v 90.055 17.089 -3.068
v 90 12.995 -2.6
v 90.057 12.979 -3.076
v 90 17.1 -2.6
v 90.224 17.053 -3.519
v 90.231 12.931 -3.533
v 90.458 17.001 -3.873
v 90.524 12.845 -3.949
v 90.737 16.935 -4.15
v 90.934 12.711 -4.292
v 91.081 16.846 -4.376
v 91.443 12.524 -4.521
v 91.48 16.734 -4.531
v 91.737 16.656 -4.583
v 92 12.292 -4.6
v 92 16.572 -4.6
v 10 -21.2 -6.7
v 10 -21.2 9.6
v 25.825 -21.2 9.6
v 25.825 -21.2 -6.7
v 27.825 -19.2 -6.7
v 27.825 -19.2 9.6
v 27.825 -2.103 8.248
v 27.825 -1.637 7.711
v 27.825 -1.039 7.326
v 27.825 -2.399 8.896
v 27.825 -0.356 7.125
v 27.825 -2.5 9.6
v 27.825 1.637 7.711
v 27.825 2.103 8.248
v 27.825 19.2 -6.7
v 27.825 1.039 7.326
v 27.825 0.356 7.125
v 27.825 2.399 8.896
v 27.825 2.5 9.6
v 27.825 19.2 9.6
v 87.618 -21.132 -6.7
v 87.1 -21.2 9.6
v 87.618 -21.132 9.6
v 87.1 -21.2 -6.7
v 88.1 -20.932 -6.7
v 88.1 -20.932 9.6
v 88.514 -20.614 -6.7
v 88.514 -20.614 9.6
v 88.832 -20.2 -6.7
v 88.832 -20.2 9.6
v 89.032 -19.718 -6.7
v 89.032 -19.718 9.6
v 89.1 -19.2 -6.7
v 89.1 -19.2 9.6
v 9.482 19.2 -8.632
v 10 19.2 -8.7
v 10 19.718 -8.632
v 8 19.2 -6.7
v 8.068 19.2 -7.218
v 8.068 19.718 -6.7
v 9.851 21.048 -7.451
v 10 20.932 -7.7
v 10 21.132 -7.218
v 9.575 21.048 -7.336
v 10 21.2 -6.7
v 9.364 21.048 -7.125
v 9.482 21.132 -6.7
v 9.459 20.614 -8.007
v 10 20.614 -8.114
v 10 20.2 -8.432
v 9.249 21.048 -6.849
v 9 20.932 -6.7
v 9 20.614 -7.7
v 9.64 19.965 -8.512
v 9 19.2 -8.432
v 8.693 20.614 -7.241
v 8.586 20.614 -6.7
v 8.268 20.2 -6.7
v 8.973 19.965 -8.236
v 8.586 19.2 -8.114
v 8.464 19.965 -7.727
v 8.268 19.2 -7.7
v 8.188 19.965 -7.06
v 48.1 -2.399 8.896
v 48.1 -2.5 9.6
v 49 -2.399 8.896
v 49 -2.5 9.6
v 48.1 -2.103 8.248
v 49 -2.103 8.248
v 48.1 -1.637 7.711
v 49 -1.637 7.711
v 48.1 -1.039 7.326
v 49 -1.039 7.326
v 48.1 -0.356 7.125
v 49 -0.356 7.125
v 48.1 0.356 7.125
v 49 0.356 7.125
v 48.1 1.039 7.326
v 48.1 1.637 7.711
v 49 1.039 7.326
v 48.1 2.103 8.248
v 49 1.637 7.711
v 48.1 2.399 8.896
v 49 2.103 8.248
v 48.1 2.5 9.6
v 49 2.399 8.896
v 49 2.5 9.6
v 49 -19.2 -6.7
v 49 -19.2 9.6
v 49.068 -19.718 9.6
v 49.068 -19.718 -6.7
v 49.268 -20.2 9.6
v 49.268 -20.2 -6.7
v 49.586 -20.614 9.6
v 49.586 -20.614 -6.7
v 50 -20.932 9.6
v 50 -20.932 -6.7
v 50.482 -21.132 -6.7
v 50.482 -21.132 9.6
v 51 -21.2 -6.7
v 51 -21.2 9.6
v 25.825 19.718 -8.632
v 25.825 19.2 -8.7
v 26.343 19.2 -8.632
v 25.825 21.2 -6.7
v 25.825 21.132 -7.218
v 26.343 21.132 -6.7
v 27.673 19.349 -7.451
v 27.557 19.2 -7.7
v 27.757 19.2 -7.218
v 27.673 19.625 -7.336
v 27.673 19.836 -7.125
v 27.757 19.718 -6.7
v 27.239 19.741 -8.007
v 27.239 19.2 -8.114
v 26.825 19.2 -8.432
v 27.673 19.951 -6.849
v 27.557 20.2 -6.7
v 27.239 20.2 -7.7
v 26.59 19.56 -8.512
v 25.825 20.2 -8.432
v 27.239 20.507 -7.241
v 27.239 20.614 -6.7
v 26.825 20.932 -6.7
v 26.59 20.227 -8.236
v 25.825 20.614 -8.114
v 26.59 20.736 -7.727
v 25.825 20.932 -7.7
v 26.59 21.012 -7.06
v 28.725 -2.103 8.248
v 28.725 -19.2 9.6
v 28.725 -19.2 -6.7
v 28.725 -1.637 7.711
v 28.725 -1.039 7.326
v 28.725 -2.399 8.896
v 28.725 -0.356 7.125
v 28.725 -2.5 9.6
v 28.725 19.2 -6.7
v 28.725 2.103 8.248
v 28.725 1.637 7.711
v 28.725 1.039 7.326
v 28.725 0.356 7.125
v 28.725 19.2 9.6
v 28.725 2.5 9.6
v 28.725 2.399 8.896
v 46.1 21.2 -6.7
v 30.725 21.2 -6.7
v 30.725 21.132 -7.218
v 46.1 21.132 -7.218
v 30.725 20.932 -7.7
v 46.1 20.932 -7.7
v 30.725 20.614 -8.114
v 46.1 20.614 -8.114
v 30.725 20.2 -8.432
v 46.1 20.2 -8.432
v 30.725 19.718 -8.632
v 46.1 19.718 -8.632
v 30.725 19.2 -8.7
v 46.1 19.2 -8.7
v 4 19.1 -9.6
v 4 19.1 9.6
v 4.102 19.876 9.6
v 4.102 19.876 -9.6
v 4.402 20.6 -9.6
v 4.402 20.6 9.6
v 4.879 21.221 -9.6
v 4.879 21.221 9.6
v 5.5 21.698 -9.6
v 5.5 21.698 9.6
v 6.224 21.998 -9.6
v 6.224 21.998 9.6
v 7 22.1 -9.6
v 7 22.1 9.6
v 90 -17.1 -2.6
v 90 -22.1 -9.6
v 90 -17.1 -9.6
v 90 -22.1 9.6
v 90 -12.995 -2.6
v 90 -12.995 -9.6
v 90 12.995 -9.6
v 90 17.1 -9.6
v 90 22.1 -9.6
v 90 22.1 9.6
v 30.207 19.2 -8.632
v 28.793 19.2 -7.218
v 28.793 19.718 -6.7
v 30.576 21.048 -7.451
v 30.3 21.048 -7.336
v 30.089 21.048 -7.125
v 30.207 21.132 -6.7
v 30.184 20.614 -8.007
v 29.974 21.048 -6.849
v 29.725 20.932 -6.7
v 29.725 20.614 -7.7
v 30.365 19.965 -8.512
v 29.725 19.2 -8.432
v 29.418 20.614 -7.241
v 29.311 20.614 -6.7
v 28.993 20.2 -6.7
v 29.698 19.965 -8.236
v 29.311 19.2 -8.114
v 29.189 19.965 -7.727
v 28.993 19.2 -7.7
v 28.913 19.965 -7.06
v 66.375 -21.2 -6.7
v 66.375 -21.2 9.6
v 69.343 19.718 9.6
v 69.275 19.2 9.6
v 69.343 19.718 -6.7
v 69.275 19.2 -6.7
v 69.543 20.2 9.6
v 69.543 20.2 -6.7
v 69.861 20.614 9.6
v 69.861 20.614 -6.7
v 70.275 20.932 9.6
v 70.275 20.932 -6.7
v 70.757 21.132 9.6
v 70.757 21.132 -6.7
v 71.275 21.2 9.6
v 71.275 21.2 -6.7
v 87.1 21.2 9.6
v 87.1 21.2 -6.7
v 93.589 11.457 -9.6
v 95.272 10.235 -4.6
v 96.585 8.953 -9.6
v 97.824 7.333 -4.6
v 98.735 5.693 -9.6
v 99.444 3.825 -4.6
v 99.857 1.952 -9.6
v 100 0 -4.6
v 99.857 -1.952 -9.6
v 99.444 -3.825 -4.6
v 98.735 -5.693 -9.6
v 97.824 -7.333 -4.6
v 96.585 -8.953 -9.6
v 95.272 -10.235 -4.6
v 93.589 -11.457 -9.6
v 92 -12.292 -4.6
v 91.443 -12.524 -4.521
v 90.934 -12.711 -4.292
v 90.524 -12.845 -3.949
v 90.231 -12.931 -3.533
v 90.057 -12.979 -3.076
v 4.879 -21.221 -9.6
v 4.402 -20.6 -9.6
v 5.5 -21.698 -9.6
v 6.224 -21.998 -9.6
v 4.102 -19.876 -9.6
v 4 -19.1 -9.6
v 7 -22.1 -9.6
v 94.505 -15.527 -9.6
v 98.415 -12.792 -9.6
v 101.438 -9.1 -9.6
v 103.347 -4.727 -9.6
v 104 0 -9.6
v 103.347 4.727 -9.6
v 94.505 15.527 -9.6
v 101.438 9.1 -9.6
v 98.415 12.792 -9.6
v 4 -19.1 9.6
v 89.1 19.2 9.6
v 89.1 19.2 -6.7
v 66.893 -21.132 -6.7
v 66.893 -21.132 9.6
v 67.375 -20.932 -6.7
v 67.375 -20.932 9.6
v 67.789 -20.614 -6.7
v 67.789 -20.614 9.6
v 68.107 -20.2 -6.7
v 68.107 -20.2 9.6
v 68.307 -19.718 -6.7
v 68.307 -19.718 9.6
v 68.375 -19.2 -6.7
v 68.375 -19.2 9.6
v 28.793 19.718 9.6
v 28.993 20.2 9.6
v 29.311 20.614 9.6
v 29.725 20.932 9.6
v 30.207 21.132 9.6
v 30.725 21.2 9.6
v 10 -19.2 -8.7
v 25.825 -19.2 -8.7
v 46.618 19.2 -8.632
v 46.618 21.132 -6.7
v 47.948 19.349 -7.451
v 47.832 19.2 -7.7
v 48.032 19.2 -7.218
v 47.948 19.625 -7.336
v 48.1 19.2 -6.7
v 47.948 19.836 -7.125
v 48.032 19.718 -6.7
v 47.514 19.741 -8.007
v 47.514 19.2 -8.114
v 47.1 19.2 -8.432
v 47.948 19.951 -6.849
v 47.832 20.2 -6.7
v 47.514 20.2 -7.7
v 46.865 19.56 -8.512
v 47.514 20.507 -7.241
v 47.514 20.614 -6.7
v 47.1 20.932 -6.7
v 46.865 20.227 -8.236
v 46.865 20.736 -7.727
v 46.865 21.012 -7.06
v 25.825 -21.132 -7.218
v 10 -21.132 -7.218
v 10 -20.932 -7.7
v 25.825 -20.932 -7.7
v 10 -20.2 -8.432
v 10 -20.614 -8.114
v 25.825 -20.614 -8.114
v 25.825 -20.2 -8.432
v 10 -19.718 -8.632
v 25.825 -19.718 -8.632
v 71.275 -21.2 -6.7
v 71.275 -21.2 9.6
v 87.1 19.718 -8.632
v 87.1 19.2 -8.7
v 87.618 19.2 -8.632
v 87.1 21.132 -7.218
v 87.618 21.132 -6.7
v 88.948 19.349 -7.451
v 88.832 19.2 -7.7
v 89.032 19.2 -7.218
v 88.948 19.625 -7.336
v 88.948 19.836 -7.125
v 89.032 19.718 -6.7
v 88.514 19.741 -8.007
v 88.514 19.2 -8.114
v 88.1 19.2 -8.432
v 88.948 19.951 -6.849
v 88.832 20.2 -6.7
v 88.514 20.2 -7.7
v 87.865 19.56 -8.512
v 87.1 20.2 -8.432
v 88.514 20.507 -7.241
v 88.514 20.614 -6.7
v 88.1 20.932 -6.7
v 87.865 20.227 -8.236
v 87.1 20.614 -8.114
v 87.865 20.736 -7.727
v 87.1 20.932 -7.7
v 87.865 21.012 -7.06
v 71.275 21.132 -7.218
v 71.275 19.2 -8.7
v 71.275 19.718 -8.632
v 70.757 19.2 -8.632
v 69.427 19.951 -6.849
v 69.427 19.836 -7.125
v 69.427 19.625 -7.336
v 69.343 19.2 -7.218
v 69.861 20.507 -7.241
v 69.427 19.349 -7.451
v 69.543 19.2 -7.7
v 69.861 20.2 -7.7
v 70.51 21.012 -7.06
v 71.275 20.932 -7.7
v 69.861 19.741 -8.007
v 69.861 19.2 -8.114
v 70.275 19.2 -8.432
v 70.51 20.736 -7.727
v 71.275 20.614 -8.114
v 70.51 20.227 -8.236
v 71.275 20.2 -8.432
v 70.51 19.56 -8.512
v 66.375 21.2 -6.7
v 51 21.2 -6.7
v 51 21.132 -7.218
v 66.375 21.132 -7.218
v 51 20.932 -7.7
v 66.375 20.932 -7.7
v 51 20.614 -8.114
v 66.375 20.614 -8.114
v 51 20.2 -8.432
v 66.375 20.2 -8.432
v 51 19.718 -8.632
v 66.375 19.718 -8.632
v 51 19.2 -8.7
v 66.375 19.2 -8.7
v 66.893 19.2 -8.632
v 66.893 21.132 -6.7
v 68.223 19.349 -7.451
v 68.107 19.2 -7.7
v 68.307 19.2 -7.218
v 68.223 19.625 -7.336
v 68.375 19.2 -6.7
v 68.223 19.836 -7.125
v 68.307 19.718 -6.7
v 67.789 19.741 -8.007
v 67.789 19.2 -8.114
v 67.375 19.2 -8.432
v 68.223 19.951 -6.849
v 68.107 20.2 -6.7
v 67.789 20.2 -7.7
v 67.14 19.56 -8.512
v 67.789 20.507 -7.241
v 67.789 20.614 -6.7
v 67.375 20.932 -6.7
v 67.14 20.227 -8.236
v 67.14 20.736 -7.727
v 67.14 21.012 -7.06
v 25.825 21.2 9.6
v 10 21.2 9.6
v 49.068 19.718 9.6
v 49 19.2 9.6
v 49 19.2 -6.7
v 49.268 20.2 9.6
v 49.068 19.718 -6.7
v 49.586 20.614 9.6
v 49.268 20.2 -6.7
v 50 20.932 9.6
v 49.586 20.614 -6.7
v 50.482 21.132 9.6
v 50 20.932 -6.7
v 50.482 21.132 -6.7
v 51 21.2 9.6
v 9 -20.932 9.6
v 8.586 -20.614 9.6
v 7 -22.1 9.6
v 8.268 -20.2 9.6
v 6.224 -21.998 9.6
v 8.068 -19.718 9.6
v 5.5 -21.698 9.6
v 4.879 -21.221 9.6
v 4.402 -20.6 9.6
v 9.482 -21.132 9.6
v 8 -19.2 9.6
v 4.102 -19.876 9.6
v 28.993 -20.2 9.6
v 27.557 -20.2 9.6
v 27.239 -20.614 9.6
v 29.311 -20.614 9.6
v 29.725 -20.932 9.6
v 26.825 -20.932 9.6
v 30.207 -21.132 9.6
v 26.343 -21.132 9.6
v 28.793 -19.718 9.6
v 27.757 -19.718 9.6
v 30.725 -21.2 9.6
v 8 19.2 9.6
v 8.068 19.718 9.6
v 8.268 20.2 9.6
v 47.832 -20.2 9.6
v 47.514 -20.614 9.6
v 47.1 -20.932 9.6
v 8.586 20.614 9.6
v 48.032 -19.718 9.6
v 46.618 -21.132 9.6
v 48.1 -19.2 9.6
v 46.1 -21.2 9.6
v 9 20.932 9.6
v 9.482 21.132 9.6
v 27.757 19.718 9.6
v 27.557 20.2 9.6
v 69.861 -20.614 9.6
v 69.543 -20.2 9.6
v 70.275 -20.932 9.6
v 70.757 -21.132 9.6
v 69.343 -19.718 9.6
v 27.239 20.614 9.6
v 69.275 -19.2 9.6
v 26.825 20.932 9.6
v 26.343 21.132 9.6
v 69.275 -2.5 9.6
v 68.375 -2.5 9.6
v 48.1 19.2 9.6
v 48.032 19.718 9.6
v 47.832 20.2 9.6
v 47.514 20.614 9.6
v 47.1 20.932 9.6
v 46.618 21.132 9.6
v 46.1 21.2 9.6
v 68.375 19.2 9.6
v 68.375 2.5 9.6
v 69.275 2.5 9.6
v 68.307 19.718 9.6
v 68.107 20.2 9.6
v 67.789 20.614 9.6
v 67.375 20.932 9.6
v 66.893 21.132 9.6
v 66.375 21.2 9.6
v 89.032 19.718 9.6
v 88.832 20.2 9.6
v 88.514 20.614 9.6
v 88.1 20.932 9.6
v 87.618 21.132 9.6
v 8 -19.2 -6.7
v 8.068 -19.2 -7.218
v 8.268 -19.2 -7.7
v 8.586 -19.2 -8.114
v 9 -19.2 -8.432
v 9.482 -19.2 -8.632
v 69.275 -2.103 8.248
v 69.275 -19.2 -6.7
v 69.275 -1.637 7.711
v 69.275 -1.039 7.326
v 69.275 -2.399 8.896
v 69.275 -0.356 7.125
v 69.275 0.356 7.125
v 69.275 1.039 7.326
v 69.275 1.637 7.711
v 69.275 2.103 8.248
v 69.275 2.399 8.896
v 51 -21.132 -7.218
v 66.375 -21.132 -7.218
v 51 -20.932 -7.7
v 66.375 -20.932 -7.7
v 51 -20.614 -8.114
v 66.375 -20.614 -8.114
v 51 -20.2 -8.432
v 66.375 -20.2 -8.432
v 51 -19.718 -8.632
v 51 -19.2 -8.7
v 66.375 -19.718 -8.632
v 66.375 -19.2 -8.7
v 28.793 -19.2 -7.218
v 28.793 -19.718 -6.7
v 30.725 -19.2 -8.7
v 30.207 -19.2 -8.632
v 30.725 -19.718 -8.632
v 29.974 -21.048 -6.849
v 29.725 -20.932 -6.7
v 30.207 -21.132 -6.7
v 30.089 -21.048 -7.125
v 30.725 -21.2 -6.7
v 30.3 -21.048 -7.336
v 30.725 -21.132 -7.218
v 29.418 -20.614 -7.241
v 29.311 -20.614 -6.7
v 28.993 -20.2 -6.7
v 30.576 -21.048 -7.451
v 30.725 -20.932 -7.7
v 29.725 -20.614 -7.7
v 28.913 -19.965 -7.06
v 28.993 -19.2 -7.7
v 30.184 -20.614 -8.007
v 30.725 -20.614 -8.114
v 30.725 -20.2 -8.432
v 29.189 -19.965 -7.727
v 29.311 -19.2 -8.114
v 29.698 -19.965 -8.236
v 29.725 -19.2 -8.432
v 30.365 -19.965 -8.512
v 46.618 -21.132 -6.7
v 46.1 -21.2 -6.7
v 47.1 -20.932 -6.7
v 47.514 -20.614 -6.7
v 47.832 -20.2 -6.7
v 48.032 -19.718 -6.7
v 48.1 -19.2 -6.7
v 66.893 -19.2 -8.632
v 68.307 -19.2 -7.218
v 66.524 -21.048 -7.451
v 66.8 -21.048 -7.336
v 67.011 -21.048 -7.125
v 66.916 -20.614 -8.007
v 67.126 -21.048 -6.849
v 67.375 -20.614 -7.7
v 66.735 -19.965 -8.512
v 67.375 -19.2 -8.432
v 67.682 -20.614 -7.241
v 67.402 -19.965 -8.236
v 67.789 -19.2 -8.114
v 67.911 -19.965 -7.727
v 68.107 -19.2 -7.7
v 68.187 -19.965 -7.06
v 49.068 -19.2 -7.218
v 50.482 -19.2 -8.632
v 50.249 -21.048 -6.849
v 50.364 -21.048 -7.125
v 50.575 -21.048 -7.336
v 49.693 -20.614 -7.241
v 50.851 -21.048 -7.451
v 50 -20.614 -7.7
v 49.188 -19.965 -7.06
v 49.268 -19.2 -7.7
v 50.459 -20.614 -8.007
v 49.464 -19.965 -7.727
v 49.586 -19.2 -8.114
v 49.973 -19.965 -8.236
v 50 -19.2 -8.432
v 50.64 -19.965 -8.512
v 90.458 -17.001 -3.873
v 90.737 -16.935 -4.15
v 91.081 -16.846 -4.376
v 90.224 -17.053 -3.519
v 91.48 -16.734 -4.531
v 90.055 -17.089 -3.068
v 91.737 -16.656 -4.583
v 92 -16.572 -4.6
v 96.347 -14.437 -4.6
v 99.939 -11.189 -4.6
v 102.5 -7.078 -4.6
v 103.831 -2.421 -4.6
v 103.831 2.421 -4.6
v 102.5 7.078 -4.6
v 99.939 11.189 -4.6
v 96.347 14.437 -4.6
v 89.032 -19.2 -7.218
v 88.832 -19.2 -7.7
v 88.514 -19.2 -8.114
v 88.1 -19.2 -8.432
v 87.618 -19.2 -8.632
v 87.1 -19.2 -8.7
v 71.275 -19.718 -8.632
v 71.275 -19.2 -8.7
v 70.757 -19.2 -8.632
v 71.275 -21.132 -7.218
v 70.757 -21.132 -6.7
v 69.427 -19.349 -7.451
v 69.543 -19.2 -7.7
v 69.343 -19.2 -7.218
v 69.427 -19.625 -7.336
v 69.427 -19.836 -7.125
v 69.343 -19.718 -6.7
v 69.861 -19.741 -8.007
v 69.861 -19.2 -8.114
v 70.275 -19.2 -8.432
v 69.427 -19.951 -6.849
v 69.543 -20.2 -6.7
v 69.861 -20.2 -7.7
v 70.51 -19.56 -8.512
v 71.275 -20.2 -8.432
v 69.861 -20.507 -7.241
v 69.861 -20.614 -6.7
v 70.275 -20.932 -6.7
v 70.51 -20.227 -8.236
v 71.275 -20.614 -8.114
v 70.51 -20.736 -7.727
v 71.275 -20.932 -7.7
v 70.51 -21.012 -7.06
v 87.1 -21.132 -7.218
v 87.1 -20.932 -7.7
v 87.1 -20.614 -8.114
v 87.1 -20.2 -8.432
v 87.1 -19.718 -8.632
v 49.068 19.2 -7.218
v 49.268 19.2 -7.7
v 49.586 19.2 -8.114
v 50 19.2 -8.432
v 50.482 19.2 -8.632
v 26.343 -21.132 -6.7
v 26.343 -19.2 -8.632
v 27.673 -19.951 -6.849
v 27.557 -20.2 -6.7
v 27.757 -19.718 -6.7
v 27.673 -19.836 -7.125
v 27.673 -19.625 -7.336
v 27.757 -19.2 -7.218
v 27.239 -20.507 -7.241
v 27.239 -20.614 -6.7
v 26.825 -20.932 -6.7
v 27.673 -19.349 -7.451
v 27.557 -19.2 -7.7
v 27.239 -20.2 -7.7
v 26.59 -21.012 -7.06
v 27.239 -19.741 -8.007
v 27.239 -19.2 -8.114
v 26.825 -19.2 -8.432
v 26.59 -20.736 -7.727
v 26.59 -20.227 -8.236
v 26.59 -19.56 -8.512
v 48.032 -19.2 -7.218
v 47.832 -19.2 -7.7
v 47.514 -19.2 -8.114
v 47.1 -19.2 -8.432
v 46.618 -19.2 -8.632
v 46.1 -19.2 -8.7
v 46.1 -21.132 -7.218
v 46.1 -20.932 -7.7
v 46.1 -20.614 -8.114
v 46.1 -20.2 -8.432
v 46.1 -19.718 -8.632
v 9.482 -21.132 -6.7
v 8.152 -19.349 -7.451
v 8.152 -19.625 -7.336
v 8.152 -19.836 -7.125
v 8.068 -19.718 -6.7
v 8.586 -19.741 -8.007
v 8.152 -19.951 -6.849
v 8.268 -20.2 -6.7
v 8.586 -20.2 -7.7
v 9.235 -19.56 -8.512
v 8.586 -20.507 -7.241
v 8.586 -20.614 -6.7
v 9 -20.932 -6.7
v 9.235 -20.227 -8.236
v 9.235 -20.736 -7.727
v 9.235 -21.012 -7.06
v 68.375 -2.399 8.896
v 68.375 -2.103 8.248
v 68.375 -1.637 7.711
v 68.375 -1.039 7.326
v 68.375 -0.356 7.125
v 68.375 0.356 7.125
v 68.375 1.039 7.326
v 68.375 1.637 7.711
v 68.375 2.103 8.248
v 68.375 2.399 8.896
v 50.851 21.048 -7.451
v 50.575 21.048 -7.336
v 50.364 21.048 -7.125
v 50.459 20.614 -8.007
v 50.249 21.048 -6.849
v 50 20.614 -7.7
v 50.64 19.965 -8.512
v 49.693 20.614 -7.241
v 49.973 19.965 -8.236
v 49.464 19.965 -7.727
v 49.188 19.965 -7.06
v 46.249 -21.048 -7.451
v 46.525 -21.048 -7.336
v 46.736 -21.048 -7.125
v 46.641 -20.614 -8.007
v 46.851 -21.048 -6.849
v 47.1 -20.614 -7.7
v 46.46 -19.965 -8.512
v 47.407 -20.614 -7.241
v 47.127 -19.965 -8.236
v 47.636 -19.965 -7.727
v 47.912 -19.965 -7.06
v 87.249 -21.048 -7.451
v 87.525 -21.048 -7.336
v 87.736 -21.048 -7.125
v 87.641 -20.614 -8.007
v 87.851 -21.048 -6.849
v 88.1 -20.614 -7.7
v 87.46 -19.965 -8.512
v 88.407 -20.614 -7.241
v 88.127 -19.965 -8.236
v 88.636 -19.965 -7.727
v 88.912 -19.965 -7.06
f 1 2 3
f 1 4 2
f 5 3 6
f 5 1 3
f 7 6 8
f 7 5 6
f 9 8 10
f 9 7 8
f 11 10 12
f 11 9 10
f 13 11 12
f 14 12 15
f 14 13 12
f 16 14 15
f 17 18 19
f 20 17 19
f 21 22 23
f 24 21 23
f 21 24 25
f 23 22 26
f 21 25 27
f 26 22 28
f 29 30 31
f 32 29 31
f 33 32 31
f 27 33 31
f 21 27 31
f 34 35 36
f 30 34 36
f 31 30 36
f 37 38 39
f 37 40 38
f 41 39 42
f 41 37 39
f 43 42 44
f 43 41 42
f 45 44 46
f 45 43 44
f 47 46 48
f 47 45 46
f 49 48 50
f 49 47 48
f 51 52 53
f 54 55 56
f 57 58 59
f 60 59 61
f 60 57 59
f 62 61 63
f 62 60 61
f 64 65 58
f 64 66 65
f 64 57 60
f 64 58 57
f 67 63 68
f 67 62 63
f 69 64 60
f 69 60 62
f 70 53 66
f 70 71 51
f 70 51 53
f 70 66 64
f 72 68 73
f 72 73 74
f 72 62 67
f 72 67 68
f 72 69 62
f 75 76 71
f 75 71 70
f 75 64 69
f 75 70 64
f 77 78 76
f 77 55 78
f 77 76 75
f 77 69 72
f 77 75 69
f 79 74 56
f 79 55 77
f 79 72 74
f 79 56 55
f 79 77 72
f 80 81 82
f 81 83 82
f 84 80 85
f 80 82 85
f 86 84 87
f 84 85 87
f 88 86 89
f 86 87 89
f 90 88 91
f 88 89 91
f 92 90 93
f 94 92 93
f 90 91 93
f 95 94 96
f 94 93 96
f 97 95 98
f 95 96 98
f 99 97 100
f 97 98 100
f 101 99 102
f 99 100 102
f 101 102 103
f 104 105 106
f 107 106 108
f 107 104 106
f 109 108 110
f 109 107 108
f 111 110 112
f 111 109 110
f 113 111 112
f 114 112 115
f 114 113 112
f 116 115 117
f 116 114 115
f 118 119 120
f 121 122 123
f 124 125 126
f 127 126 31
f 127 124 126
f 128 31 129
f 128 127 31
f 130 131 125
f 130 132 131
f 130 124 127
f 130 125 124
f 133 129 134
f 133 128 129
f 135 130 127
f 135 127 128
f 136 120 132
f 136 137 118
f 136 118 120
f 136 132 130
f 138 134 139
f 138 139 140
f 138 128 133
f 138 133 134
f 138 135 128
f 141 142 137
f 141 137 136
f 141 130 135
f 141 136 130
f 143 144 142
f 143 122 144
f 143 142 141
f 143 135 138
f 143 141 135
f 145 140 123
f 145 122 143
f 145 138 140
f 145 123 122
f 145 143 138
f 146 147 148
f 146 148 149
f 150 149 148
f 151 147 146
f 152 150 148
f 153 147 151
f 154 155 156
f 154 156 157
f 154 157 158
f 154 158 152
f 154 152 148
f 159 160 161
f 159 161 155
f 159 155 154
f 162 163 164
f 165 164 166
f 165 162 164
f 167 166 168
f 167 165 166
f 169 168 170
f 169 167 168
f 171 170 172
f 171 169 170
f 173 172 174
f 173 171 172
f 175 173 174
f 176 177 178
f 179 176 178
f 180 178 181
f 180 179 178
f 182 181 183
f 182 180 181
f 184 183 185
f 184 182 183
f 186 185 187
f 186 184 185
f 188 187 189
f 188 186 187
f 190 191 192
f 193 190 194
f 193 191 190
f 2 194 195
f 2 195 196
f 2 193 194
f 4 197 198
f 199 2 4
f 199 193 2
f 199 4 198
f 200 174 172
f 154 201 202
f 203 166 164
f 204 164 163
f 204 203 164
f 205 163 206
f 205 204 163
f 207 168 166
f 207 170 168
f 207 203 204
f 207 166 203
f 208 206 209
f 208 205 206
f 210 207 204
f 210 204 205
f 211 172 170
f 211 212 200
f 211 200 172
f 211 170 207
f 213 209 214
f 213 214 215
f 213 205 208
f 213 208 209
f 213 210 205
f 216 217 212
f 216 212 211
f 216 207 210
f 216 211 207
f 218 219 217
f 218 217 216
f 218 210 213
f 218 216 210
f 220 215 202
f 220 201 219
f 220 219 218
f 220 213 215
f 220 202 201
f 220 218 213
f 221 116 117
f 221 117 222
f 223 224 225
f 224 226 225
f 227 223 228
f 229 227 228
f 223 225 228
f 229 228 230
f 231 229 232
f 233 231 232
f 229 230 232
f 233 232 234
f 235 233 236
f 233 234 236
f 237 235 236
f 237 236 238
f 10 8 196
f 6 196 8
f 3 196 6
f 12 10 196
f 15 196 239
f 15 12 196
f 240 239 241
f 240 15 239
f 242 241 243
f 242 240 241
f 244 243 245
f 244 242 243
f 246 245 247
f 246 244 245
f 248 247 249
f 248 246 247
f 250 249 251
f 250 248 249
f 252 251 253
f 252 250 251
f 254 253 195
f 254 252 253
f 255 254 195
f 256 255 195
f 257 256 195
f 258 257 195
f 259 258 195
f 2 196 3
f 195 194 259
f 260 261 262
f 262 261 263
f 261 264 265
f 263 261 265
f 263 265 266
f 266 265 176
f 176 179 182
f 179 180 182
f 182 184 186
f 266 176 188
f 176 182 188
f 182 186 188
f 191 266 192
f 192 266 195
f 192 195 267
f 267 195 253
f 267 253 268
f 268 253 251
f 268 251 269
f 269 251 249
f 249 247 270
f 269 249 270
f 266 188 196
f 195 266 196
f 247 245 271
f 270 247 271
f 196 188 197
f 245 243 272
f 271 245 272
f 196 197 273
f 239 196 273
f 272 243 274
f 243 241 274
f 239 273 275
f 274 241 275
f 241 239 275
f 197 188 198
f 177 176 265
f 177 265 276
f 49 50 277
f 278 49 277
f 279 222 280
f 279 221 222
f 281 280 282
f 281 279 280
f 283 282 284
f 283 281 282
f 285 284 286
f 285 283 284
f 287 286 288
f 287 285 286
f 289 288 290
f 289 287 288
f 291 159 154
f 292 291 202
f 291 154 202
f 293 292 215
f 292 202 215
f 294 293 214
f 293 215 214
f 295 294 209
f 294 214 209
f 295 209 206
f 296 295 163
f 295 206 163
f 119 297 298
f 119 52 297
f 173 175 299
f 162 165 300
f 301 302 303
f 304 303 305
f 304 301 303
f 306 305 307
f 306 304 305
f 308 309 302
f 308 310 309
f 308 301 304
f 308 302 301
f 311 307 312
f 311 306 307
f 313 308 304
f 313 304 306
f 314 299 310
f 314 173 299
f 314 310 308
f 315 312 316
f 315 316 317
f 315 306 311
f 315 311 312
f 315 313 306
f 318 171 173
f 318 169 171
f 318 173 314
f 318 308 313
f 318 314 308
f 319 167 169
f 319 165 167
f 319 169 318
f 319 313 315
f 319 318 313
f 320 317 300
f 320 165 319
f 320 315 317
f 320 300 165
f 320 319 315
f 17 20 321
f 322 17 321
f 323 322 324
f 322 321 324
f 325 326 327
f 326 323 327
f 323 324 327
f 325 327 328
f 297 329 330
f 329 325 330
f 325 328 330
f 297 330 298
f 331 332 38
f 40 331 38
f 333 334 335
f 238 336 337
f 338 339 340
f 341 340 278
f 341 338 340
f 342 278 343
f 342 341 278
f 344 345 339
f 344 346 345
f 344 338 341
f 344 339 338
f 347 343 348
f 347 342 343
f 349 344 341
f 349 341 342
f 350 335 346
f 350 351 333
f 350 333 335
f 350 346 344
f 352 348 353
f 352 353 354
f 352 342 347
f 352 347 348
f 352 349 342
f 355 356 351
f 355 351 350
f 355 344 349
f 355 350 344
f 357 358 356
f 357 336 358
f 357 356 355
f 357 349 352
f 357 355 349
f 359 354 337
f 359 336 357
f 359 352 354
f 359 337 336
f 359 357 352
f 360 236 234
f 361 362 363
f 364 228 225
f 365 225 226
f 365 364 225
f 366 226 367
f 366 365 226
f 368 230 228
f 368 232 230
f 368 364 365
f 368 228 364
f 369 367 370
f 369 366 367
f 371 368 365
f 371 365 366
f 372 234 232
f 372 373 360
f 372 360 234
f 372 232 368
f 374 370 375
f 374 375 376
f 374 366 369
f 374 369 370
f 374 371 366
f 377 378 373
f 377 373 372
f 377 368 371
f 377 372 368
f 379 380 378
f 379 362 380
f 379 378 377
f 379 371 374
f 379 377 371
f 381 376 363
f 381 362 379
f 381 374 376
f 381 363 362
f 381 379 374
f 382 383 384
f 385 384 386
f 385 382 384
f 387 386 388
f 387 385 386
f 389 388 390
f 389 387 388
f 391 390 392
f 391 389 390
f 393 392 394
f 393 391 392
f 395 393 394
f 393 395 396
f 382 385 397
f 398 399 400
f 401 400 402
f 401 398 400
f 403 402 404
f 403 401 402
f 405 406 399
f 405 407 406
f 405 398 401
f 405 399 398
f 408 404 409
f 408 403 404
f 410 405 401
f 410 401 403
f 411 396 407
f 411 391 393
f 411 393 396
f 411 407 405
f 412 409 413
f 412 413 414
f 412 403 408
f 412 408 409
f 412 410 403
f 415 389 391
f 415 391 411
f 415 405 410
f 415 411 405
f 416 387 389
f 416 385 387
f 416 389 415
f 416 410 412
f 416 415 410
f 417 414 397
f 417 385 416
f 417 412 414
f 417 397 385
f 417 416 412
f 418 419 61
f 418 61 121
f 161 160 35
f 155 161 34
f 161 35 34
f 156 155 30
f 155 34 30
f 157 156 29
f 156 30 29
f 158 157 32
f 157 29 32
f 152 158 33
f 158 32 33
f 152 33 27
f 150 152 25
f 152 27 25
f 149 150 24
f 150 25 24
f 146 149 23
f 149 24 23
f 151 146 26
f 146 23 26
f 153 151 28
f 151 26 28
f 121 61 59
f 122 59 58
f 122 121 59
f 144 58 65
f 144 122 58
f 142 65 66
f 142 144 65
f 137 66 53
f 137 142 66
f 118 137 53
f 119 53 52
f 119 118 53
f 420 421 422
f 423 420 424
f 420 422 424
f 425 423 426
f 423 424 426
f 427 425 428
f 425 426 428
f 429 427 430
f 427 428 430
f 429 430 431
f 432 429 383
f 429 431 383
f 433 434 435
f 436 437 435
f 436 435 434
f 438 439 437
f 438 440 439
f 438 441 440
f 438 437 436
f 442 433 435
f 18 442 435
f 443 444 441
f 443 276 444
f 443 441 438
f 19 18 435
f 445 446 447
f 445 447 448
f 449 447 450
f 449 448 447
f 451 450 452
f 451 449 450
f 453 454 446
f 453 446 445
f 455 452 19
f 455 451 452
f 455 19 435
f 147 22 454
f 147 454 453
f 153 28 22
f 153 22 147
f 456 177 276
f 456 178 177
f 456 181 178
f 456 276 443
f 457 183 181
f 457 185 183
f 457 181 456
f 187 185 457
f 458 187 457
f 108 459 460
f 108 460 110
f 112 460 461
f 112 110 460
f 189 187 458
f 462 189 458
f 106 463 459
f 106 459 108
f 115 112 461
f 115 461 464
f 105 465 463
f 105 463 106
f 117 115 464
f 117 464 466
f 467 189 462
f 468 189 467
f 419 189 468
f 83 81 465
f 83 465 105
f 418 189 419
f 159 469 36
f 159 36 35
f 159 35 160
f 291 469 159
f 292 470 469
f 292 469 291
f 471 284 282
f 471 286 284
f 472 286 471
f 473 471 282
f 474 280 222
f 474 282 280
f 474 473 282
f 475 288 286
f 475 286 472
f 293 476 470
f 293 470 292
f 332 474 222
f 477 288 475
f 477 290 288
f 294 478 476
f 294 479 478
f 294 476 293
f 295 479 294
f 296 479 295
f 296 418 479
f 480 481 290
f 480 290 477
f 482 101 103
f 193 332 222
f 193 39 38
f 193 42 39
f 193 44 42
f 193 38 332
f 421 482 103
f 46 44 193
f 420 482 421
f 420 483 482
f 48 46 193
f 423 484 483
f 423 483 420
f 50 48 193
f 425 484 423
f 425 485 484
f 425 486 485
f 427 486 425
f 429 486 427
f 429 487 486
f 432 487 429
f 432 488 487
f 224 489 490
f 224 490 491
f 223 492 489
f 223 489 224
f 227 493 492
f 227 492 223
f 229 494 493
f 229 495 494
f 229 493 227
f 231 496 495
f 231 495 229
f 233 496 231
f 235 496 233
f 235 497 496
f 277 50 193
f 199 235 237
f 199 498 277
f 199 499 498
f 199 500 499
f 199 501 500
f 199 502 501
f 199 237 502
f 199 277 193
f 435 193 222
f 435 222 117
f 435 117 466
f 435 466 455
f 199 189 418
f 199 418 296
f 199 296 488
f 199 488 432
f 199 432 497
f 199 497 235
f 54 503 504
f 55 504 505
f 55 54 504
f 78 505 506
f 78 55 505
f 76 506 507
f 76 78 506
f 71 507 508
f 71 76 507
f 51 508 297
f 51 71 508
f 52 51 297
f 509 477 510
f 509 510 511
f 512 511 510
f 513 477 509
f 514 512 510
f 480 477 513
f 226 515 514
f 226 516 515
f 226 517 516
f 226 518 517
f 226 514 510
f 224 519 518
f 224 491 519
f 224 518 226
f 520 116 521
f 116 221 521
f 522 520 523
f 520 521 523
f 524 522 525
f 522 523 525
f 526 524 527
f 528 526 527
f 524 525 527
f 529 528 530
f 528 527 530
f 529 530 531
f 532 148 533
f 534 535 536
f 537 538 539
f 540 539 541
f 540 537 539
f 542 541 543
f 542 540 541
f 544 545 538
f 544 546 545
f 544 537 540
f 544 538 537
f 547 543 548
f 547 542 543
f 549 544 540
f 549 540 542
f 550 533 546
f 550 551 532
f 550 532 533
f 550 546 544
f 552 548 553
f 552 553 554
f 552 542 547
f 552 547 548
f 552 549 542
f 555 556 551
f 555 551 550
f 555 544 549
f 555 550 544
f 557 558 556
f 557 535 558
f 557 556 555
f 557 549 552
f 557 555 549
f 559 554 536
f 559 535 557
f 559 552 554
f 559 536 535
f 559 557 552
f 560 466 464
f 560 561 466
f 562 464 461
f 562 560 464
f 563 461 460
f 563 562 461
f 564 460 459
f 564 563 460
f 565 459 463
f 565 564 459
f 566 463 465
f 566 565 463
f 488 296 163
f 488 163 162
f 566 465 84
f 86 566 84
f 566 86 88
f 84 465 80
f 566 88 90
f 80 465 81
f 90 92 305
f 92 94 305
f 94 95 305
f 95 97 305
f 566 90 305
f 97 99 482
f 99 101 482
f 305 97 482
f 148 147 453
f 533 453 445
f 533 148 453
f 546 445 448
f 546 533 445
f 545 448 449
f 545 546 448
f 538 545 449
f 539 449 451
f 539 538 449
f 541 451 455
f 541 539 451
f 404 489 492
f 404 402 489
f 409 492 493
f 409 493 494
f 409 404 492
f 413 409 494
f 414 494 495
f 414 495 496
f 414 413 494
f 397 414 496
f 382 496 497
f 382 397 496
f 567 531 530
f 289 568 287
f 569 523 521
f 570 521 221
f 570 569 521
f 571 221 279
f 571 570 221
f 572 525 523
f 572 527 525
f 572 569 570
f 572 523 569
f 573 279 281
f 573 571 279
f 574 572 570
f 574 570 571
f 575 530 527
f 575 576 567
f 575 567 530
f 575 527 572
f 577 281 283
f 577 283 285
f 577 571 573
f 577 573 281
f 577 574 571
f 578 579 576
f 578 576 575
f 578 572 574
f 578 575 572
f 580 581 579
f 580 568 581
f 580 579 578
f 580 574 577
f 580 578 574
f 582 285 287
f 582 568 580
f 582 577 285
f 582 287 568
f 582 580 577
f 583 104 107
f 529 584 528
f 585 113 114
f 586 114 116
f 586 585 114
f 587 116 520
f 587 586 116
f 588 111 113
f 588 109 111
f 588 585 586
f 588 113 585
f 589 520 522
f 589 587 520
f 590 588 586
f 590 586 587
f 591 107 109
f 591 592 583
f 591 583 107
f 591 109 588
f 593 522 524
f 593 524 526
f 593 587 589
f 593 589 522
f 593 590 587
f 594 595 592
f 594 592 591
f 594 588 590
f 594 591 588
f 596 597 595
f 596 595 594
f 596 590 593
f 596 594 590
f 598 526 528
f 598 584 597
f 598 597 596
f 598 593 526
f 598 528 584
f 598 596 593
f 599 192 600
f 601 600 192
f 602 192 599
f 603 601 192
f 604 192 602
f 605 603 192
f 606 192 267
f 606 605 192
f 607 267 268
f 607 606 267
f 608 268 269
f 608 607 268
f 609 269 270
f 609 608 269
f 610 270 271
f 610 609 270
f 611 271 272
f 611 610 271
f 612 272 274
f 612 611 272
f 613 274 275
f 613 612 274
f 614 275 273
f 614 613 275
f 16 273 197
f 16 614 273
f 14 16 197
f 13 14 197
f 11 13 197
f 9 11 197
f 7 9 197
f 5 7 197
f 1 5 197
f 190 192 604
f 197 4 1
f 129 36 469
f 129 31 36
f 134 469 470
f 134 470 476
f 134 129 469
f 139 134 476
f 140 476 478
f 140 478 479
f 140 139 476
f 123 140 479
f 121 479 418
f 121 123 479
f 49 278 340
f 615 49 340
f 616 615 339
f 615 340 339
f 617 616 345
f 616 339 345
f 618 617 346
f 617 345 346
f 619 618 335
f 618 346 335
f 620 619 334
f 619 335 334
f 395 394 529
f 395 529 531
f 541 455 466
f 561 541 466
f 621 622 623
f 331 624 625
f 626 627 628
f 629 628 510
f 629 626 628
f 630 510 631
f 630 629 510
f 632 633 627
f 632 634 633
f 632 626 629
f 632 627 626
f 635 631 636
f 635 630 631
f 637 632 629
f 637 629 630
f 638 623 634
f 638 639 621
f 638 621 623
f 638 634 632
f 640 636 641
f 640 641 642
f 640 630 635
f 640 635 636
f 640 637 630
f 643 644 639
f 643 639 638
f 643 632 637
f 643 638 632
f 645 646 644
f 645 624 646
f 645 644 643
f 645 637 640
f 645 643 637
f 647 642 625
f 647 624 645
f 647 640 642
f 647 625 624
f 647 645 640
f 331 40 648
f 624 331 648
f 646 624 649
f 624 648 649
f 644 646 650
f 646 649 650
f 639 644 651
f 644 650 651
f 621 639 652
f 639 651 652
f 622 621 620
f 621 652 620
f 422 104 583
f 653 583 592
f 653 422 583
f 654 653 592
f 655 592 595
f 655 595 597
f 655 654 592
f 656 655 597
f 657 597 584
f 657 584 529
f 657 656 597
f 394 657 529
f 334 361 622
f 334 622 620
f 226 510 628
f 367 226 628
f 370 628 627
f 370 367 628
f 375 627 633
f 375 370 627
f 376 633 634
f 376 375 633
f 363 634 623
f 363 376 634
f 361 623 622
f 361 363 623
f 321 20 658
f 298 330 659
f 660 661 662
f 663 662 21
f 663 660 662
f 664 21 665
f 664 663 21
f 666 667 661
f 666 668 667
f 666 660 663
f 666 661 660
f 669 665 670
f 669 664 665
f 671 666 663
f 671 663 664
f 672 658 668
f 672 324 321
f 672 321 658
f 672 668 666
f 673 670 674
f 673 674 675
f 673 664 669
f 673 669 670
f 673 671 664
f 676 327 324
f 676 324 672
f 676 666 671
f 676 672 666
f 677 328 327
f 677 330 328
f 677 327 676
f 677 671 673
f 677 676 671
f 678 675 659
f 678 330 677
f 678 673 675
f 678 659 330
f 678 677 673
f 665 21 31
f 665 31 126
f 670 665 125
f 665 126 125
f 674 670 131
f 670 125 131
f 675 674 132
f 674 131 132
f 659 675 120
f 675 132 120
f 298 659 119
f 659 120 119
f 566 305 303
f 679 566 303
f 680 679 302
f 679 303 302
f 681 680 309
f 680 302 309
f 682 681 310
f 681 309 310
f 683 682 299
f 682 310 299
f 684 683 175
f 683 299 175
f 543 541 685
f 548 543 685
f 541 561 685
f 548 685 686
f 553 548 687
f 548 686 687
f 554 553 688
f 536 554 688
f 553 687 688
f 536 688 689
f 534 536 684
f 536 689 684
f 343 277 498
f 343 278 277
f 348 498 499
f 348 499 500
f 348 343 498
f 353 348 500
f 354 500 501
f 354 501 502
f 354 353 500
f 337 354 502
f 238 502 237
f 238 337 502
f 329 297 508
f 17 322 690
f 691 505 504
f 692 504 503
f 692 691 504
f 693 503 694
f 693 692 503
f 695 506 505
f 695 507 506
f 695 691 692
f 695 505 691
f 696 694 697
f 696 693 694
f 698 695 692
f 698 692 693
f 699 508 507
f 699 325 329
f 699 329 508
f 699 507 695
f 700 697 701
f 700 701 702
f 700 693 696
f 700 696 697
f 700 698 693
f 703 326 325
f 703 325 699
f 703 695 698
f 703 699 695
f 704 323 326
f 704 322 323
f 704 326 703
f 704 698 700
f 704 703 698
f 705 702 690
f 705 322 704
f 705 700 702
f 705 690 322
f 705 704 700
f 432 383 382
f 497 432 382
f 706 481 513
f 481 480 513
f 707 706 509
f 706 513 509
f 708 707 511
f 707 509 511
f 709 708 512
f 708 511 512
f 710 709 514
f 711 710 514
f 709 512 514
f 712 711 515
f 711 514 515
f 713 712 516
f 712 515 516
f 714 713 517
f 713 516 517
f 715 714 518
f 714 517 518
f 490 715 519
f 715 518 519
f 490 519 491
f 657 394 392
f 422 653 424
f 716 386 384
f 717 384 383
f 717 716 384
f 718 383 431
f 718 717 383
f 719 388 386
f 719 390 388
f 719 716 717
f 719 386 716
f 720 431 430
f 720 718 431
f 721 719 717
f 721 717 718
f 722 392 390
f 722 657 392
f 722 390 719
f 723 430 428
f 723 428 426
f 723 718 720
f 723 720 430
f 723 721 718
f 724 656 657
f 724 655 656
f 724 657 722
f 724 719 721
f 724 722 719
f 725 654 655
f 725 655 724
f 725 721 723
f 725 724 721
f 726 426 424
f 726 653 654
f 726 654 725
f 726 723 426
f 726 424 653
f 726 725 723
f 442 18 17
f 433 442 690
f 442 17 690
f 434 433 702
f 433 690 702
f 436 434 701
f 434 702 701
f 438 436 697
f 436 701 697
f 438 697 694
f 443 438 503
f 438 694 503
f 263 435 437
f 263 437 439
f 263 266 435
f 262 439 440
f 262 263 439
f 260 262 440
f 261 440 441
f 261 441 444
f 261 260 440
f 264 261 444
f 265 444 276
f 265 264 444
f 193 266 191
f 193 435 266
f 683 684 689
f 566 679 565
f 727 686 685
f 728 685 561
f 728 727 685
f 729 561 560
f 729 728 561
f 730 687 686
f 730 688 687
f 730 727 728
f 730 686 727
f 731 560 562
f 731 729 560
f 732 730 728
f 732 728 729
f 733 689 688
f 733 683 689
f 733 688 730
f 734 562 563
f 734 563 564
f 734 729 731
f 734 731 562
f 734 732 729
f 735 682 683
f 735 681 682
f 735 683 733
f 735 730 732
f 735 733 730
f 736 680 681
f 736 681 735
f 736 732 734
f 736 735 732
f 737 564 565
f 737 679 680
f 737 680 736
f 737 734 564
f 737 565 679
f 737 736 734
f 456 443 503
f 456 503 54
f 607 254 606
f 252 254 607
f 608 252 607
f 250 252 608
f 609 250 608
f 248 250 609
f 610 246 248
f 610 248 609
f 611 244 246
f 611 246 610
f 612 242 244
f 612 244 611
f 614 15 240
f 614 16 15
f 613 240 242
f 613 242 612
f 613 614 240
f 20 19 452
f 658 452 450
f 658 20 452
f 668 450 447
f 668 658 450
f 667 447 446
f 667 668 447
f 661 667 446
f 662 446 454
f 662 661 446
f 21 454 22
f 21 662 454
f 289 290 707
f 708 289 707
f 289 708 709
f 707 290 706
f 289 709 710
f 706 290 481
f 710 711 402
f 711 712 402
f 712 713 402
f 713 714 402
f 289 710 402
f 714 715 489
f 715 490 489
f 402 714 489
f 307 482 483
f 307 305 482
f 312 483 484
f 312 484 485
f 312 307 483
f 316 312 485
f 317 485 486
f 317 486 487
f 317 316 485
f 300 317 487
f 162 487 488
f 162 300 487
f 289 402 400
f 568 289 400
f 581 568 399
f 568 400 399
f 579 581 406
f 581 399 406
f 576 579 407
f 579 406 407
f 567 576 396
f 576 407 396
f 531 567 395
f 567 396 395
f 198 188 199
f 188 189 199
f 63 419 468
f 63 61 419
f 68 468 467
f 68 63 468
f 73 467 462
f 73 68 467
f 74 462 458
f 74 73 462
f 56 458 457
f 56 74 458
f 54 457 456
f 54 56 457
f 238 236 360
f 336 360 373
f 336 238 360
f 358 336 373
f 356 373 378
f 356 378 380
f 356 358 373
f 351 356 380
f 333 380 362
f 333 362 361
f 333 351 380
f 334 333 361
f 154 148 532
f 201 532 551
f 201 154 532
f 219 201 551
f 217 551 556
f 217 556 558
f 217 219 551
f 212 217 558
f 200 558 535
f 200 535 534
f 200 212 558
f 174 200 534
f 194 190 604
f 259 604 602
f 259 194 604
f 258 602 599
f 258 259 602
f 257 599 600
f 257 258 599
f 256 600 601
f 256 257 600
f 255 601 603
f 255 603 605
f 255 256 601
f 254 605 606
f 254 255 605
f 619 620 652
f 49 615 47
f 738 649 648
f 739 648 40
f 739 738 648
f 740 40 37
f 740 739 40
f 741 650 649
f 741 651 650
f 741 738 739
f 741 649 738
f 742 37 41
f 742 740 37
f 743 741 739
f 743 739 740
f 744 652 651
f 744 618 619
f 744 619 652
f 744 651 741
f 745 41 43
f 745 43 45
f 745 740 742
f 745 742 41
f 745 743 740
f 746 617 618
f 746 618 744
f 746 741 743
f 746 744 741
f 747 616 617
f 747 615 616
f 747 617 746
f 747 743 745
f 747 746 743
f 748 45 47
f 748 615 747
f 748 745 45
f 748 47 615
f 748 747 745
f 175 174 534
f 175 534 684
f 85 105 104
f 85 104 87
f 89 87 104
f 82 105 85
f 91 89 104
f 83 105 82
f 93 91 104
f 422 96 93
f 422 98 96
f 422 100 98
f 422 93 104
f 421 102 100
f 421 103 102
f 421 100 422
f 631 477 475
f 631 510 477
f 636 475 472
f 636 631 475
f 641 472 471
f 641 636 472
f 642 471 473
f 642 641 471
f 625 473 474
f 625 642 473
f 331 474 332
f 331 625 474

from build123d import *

# Parameters (mm, degrees)
SKETCH_1_W                  = 86
SKETCH_1_H                  = 44.2
EXTRUDE_1_DEPTH             = 14.2
EXTRUDE_2_DEPTH             = 5
SKETCH_3_W                  = 19.825
SKETCH_3_H                  = 42.4
CUT_EXTRUDE_1_DEPTH         = 18.3
SKETCH_4_W                  = 19.375
SKETCH_4_H                  = 42.4
CUT_EXTRUDE_2_DEPTH         = 18.3
SKETCH_5_W                  = 19.375
SKETCH_5_H                  = 42.4
CUT_EXTRUDE_3_DEPTH         = 18.3
SKETCH_6_W                  = 19.825
SKETCH_6_H                  = 42.4
CUT_EXTRUDE_4_DEPTH         = 18.3
HOLE_WIZARD_8_3_8_3_1_D     = 8.3
HOLE_WIZARD_8_3_8_3_1_DEPTH = 3.2
HOLE_WIZARD_5_0_5_1_D       = 5
HOLE_WIZARD_5_0_5_1_DEPTH   = 0.9
HOLE_WIZARD_5_0_5_2_D       = 5
HOLE_WIZARD_5_0_5_2_DEPTH   = 0.9
HOLE_WIZARD_5_0_5_3_D       = 5
HOLE_WIZARD_5_0_5_3_DEPTH   = 0.9
FILLET_1_R                  = 3
EXTRUDE_START               = -3.5
SKETCH_15_R                 = 4.15
EXTRUDE_3_DEPTH             = 3.5
FILLET_3_R                  = 2


with BuildPart() as part:
    # Эскиз1 → Бобышка-Вытянуть1 (new body)
    with BuildSketch(Plane.XY.offset(9.6)):
        with Locations((47, 0)):
            Rectangle(SKETCH_1_W, SKETCH_1_H)
    extrude(amount=-EXTRUDE_1_DEPTH)

    # Эскиз2 → Бобышка-Вытянуть2 (add)
    with BuildSketch(Plane(origin=(0, 0, -4.6), x_dir=(-1, 0, 0), z_dir=(0, 0, -1))):
        with BuildLine():
            Line((-90, -22.1), (-90, -17.1))
            ThreePointArc((-90, -17.1), (-104, 0), (-90, 17.1))
            Line((-90, 17.1), (-90, 22.1))
            Line((-90, 22.1), (-4, 22.1))
            Line((-4, 22.1), (-4, -22.1))
            Line((-4, -22.1), (-90, -22.1))
        make_face()
        with BuildLine():
            Line((-90, -12.994779171), (-90, 12.994779171))
            ThreePointArc((-90, 12.994779171), (-100, 0), (-90, -12.994779171))
        make_face(mode=Mode.SUBTRACT)
    extrude(amount=EXTRUDE_2_DEPTH)

    # Эскиз3 → Вырез-Вытянуть1 (cut)
    with BuildSketch(Plane.XY.offset(9.6)):
        with Locations((79.1875, 0)):
            Rectangle(SKETCH_3_W, SKETCH_3_H)
    extrude(amount=-CUT_EXTRUDE_1_DEPTH, mode=Mode.SUBTRACT)

    # Эскиз4 → Вырез-Вытянуть2 (cut)
    with BuildSketch(Plane.XY.offset(9.6)):
        with Locations((58.6875, 0)):
            Rectangle(SKETCH_4_W, SKETCH_4_H)
    extrude(amount=-CUT_EXTRUDE_2_DEPTH, mode=Mode.SUBTRACT)

    # Эскиз5 → Вырез-Вытянуть3 (cut)
    with BuildSketch(Plane.XY.offset(9.6)):
        with Locations((38.4125, 0)):
            Rectangle(SKETCH_5_W, SKETCH_5_H)
    extrude(amount=-CUT_EXTRUDE_3_DEPTH, mode=Mode.SUBTRACT)

    # Эскиз6 → Вырез-Вытянуть4 (cut)
    with BuildSketch(Plane.XY.offset(9.6)):
        with Locations((17.9125, 0)):
            Rectangle(SKETCH_6_W, SKETCH_6_H)
    extrude(amount=-CUT_EXTRUDE_4_DEPTH, mode=Mode.SUBTRACT)

    # Диаметр отверстия Ø8.3 (8.3)1
    with Locations(Plane.ZY.offset(-4)):
        with Locations((0, 0)):
            Hole(HOLE_WIZARD_8_3_8_3_1_D / 2, depth=HOLE_WIZARD_8_3_8_3_1_DEPTH)

    # Диаметр отверстия Ø5.0 (5)1
    with Locations(Plane(origin=(28.725, 0, 0), x_dir=(0, 0, -1), z_dir=(1, 0, 0))):
        with Locations((-9.6, 0)):
            Hole(HOLE_WIZARD_5_0_5_1_D / 2, depth=HOLE_WIZARD_5_0_5_1_DEPTH)

    # Диаметр отверстия Ø5.0 (5)2
    with Locations(Plane.ZY.offset(-48.1)):
        with Locations((9.6, 0)):
            Hole(HOLE_WIZARD_5_0_5_2_D / 2, depth=HOLE_WIZARD_5_0_5_2_DEPTH)

    # Диаметр отверстия Ø5.0 (5)3
    with Locations(Plane.ZY.offset(-68.375)):
        with Locations((9.6, 0)):
            Hole(HOLE_WIZARD_5_0_5_3_D / 2, depth=HOLE_WIZARD_5_0_5_3_DEPTH)

    # Скругление1
    fillet_1_edges = [part.edges().sort_by_distance(p)[0] for p in [
        (4, -22.1, 0),
        (4, 22.1, 0),
    ]]
    fillet(fillet_1_edges, radius=FILLET_1_R)

    # Эскиз15 → Бобышка-Вытянуть3 (add)
    with BuildSketch(Plane.ZY.offset(-4).offset(EXTRUDE_START)):
        Circle(SKETCH_15_R)
    extrude(amount=EXTRUDE_3_DEPTH)

    # Скругление3
    fillet_3_edges = [part.edges().sort_by_distance(p)[0] for p in [
        (90, -15.047389586, -4.6),
        (90, 15.047389586, -4.6),
        (79.1875, 21.2, -8.7),
        (69.275, 21.2, 0.45),
        (89.1, 0, -8.7),
        (89.1, 21.2, 0.45),
        (79.1875, -21.2, -8.7),
        (89.1, -21.2, 0.45),
        (69.275, 0, -8.7),
        (69.275, -21.2, 0.45),
        (49, 0, -8.7),
        (49, -21.2, 0.45),
        (58.6875, 21.2, -8.7),
        (49, 21.2, 0.45),
        (68.375, 0, -8.7),
        (68.375, 21.2, 0.45),
        (58.6875, -21.2, -8.7),
        (68.375, -21.2, 0.45),
        (28.725, 0, -8.7),
        (28.725, -21.2, 0.45),
        (38.4125, 21.2, -8.7),
        (28.725, 21.2, 0.45),
        (48.1, 0, -8.7),
        (48.1, 21.2, 0.45),
        (38.4125, -21.2, -8.7),
        (48.1, -21.2, 0.45),
        (17.9125, -21.2, -8.7),
        (27.825, -21.2, 0.45),
        (8, 0, -8.7),
        (8, -21.2, 0.45),
        (17.9125, 21.2, -8.7),
        (8, 21.2, 0.45),
        (27.825, 0, -8.7),
        (27.825, 21.2, 0.45),
    ]]
    fillet(fillet_3_edges, radius=FILLET_3_R)


solid = part.part
